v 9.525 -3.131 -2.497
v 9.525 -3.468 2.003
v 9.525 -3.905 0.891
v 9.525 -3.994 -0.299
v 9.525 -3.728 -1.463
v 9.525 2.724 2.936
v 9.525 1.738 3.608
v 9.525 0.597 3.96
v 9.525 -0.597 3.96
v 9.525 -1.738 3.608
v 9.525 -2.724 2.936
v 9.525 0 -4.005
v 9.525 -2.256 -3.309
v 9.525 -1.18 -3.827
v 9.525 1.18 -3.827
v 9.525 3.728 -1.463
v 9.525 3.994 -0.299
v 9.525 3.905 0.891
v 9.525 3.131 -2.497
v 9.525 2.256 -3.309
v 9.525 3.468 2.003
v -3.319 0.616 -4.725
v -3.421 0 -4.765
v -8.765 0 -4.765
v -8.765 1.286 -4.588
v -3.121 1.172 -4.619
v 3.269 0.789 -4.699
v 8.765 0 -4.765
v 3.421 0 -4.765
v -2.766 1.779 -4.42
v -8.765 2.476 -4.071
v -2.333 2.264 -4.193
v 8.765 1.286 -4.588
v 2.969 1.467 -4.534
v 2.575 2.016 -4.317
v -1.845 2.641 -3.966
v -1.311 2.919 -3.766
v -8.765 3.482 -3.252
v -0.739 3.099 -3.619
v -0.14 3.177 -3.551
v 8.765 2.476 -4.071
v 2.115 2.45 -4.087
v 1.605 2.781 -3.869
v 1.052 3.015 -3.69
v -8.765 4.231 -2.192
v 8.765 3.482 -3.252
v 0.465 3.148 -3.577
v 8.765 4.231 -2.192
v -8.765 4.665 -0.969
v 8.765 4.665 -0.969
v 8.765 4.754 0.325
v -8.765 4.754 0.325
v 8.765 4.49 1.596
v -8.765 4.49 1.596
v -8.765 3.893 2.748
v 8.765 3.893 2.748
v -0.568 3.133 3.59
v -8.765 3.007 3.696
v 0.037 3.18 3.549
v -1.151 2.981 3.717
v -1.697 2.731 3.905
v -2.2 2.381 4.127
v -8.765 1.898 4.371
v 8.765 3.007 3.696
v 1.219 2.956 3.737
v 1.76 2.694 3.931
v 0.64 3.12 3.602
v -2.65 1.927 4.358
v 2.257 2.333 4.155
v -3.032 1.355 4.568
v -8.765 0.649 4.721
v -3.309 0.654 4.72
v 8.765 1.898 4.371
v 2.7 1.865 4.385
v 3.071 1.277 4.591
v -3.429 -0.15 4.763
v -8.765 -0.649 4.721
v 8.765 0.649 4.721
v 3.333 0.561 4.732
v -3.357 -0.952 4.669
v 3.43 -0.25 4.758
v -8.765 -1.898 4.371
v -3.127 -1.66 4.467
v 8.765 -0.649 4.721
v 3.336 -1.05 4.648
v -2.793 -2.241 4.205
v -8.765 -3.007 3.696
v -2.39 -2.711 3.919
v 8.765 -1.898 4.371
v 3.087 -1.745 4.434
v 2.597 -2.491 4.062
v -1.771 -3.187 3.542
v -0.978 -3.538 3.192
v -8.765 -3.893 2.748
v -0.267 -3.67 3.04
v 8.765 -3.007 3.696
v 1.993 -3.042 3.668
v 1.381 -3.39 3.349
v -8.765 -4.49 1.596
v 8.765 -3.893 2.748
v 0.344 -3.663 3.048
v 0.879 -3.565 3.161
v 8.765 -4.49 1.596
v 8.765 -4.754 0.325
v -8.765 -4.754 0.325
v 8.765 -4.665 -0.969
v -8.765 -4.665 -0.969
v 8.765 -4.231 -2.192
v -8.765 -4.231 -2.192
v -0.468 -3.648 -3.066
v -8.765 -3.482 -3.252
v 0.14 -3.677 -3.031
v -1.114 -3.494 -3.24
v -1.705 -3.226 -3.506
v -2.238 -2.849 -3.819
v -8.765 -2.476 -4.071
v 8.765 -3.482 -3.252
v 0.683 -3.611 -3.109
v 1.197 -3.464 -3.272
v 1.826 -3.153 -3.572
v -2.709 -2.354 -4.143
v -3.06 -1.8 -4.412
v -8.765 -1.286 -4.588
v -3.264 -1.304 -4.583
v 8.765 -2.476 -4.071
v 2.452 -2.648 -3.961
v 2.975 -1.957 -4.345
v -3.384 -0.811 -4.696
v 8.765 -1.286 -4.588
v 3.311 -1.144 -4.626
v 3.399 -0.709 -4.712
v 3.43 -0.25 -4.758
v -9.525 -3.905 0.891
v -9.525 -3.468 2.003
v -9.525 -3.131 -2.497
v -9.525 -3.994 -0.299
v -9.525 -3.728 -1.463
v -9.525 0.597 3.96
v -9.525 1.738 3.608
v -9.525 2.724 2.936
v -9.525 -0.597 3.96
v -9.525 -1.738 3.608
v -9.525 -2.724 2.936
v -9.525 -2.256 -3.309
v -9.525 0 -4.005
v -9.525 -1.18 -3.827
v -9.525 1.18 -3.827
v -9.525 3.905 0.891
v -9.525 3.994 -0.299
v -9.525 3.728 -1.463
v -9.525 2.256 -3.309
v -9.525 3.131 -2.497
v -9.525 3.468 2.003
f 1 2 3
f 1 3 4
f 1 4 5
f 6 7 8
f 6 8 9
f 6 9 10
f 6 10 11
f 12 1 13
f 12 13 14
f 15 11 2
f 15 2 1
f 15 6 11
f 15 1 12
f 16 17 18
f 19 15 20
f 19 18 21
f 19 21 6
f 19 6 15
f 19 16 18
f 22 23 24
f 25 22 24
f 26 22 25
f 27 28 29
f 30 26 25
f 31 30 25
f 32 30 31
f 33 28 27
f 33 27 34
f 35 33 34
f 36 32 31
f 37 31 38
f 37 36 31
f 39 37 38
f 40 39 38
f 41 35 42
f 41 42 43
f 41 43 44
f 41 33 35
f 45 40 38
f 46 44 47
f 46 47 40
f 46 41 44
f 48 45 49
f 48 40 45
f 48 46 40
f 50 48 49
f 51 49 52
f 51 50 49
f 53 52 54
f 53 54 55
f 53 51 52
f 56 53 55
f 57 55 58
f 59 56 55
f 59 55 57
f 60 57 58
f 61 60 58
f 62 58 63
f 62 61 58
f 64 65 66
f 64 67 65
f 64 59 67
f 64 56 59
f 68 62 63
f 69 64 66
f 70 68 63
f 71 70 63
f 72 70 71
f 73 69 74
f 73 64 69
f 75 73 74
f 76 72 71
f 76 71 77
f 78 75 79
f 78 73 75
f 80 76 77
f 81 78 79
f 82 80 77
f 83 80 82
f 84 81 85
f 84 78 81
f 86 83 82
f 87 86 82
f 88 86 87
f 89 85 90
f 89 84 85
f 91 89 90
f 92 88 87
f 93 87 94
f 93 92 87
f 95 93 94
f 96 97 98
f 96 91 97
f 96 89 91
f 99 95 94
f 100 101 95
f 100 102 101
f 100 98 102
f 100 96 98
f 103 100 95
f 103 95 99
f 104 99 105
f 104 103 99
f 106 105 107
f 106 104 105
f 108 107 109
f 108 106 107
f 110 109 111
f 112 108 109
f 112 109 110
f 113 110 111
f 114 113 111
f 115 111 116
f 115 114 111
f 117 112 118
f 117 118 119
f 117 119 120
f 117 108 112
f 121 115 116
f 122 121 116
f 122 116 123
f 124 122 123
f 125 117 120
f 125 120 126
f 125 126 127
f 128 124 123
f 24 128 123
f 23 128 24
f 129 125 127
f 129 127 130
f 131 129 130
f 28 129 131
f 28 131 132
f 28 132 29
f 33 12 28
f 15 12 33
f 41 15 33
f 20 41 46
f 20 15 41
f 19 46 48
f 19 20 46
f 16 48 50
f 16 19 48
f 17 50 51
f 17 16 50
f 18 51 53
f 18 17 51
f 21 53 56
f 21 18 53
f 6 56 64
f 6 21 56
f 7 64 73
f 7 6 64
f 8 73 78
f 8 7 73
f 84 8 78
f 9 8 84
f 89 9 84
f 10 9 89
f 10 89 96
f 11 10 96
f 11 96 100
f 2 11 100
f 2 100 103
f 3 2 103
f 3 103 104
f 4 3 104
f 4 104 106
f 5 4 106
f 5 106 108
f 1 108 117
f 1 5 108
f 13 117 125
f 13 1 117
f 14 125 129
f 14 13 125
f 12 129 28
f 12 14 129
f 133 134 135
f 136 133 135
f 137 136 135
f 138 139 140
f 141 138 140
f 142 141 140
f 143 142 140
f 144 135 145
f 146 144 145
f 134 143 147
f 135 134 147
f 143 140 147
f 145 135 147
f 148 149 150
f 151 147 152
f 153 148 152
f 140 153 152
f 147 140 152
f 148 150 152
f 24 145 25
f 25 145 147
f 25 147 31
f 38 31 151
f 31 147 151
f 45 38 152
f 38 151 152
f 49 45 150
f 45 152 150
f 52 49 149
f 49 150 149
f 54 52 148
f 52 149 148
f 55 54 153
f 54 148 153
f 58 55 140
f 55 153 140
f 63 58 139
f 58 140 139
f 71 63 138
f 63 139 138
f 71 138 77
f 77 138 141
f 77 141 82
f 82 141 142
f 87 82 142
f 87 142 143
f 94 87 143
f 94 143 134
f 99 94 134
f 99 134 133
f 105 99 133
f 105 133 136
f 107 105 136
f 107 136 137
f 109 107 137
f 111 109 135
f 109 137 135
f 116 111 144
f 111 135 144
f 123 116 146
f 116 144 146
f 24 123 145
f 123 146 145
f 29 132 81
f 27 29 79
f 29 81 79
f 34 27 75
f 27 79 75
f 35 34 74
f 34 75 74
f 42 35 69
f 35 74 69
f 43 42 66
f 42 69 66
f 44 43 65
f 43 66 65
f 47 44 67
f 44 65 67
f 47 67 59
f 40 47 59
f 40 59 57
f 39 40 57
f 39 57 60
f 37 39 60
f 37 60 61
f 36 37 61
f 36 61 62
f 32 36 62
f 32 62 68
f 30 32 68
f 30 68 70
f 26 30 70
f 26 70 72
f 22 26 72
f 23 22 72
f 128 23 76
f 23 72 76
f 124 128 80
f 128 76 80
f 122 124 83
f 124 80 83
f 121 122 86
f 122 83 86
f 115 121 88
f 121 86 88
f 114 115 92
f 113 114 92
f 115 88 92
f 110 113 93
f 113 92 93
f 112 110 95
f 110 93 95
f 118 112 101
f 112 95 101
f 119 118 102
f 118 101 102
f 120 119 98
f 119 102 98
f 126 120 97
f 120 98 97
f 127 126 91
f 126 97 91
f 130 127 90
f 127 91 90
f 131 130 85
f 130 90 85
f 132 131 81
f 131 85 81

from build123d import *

# Parameters (mm, degrees)
ESQUISSE1_R             = 4.765
BOSS_EXTRU_1_DEPTH      = 9.525
CHANFREIN1_SIZE         = 0.76
ESQUISSE2_R             = 3.43
ENL_V_MAT_EXTRU_1_DEPTH = 9.525


with BuildPart() as part:
    # Esquisse1 → Boss.-Extru.1 (new body, symmetric)
    with BuildSketch(Plane(origin=(0, 0, 0), x_dir=(0, 0, -1), z_dir=(1, 0, 0))):
        Circle(ESQUISSE1_R)
    extrude(amount=BOSS_EXTRU_1_DEPTH, both=True)

    # Chanfrein1
    chanfrein1_edges = [part.edges().sort_by_distance(p)[0] for p in [
        (-9.525, 0, 4.765),
        (9.525, 0, 4.765),
    ]]
    chamfer(chanfrein1_edges, length=CHANFREIN1_SIZE)

    # Esquisse2 → Enlèv. mat.-Extru.1 (cut, symmetric)
    with BuildSketch(Plane.XY):
        with Locations((0, -0.25)):
            Circle(ESQUISSE2_R)
    extrude(amount=ENL_V_MAT_EXTRU_1_DEPTH, both=True, mode=Mode.SUBTRACT)


solid = part.part
